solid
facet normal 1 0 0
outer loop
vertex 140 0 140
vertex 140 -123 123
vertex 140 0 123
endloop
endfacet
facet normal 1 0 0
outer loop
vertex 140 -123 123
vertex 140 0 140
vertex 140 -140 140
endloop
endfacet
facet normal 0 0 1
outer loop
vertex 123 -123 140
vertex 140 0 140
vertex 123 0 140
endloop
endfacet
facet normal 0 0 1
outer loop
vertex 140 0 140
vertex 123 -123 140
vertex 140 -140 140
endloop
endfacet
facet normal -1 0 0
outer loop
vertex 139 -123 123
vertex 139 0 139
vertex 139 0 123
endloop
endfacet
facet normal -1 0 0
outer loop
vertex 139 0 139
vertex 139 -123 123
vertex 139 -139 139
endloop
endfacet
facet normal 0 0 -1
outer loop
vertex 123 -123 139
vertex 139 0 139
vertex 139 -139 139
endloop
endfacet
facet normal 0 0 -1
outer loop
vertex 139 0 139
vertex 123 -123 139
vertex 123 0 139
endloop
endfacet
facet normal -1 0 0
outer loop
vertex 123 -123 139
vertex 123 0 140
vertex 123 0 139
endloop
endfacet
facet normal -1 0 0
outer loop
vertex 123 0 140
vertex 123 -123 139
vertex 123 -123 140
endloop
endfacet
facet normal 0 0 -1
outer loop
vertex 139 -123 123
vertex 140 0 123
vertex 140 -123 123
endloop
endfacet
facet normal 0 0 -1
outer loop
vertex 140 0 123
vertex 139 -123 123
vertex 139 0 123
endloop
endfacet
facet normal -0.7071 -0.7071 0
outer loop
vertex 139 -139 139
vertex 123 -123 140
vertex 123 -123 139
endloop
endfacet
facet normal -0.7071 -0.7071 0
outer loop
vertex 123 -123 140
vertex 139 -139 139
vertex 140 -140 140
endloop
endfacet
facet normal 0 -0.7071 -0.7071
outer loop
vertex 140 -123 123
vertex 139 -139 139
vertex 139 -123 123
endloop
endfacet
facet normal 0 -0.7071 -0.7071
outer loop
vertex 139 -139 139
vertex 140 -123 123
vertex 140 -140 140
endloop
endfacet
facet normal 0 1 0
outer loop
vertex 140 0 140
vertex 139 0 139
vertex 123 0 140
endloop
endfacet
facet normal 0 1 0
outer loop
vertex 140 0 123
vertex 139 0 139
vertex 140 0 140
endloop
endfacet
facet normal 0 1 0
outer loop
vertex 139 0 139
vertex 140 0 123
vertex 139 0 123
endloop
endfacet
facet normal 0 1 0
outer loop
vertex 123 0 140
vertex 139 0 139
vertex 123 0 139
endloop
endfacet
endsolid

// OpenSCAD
cubeWall = 278;
cubeThickness = 1;
cubeSide = 32;

edgeCoverCube();

module edgeCoverCube() {
    difference() {
        intersection() {
            difference() {
                cube([cubeWall+cubeThickness*2,cubeWall+cubeThickness*2,cubeWall+cubeThickness*2],center=true);
                cube([cubeWall,cubeWall,cubeWall],center=true);
                cube([cubeWall-cubeSide,cubeWall-cubeSide,2*cubeWall],center=true);
                cube([cubeWall-cubeSide,2*cubeWall,cubeWall-cubeSide],center=true);
                cube([2*cubeWall,cubeWall-cubeSide,cubeWall-cubeSide],center=true);
            }
            rotate([0,0,-45]) translate([0,0,-3*cubeWall/2]) cube([3*cubeWall,3*cubeWall,3*cubeWall]);
            rotate([45,0,0]) cube([3*cubeWall,3*cubeWall,3*cubeWall]);
        }
        cube([3*cubeWall,3*cubeWall,3*cubeWall]);
    }
}
